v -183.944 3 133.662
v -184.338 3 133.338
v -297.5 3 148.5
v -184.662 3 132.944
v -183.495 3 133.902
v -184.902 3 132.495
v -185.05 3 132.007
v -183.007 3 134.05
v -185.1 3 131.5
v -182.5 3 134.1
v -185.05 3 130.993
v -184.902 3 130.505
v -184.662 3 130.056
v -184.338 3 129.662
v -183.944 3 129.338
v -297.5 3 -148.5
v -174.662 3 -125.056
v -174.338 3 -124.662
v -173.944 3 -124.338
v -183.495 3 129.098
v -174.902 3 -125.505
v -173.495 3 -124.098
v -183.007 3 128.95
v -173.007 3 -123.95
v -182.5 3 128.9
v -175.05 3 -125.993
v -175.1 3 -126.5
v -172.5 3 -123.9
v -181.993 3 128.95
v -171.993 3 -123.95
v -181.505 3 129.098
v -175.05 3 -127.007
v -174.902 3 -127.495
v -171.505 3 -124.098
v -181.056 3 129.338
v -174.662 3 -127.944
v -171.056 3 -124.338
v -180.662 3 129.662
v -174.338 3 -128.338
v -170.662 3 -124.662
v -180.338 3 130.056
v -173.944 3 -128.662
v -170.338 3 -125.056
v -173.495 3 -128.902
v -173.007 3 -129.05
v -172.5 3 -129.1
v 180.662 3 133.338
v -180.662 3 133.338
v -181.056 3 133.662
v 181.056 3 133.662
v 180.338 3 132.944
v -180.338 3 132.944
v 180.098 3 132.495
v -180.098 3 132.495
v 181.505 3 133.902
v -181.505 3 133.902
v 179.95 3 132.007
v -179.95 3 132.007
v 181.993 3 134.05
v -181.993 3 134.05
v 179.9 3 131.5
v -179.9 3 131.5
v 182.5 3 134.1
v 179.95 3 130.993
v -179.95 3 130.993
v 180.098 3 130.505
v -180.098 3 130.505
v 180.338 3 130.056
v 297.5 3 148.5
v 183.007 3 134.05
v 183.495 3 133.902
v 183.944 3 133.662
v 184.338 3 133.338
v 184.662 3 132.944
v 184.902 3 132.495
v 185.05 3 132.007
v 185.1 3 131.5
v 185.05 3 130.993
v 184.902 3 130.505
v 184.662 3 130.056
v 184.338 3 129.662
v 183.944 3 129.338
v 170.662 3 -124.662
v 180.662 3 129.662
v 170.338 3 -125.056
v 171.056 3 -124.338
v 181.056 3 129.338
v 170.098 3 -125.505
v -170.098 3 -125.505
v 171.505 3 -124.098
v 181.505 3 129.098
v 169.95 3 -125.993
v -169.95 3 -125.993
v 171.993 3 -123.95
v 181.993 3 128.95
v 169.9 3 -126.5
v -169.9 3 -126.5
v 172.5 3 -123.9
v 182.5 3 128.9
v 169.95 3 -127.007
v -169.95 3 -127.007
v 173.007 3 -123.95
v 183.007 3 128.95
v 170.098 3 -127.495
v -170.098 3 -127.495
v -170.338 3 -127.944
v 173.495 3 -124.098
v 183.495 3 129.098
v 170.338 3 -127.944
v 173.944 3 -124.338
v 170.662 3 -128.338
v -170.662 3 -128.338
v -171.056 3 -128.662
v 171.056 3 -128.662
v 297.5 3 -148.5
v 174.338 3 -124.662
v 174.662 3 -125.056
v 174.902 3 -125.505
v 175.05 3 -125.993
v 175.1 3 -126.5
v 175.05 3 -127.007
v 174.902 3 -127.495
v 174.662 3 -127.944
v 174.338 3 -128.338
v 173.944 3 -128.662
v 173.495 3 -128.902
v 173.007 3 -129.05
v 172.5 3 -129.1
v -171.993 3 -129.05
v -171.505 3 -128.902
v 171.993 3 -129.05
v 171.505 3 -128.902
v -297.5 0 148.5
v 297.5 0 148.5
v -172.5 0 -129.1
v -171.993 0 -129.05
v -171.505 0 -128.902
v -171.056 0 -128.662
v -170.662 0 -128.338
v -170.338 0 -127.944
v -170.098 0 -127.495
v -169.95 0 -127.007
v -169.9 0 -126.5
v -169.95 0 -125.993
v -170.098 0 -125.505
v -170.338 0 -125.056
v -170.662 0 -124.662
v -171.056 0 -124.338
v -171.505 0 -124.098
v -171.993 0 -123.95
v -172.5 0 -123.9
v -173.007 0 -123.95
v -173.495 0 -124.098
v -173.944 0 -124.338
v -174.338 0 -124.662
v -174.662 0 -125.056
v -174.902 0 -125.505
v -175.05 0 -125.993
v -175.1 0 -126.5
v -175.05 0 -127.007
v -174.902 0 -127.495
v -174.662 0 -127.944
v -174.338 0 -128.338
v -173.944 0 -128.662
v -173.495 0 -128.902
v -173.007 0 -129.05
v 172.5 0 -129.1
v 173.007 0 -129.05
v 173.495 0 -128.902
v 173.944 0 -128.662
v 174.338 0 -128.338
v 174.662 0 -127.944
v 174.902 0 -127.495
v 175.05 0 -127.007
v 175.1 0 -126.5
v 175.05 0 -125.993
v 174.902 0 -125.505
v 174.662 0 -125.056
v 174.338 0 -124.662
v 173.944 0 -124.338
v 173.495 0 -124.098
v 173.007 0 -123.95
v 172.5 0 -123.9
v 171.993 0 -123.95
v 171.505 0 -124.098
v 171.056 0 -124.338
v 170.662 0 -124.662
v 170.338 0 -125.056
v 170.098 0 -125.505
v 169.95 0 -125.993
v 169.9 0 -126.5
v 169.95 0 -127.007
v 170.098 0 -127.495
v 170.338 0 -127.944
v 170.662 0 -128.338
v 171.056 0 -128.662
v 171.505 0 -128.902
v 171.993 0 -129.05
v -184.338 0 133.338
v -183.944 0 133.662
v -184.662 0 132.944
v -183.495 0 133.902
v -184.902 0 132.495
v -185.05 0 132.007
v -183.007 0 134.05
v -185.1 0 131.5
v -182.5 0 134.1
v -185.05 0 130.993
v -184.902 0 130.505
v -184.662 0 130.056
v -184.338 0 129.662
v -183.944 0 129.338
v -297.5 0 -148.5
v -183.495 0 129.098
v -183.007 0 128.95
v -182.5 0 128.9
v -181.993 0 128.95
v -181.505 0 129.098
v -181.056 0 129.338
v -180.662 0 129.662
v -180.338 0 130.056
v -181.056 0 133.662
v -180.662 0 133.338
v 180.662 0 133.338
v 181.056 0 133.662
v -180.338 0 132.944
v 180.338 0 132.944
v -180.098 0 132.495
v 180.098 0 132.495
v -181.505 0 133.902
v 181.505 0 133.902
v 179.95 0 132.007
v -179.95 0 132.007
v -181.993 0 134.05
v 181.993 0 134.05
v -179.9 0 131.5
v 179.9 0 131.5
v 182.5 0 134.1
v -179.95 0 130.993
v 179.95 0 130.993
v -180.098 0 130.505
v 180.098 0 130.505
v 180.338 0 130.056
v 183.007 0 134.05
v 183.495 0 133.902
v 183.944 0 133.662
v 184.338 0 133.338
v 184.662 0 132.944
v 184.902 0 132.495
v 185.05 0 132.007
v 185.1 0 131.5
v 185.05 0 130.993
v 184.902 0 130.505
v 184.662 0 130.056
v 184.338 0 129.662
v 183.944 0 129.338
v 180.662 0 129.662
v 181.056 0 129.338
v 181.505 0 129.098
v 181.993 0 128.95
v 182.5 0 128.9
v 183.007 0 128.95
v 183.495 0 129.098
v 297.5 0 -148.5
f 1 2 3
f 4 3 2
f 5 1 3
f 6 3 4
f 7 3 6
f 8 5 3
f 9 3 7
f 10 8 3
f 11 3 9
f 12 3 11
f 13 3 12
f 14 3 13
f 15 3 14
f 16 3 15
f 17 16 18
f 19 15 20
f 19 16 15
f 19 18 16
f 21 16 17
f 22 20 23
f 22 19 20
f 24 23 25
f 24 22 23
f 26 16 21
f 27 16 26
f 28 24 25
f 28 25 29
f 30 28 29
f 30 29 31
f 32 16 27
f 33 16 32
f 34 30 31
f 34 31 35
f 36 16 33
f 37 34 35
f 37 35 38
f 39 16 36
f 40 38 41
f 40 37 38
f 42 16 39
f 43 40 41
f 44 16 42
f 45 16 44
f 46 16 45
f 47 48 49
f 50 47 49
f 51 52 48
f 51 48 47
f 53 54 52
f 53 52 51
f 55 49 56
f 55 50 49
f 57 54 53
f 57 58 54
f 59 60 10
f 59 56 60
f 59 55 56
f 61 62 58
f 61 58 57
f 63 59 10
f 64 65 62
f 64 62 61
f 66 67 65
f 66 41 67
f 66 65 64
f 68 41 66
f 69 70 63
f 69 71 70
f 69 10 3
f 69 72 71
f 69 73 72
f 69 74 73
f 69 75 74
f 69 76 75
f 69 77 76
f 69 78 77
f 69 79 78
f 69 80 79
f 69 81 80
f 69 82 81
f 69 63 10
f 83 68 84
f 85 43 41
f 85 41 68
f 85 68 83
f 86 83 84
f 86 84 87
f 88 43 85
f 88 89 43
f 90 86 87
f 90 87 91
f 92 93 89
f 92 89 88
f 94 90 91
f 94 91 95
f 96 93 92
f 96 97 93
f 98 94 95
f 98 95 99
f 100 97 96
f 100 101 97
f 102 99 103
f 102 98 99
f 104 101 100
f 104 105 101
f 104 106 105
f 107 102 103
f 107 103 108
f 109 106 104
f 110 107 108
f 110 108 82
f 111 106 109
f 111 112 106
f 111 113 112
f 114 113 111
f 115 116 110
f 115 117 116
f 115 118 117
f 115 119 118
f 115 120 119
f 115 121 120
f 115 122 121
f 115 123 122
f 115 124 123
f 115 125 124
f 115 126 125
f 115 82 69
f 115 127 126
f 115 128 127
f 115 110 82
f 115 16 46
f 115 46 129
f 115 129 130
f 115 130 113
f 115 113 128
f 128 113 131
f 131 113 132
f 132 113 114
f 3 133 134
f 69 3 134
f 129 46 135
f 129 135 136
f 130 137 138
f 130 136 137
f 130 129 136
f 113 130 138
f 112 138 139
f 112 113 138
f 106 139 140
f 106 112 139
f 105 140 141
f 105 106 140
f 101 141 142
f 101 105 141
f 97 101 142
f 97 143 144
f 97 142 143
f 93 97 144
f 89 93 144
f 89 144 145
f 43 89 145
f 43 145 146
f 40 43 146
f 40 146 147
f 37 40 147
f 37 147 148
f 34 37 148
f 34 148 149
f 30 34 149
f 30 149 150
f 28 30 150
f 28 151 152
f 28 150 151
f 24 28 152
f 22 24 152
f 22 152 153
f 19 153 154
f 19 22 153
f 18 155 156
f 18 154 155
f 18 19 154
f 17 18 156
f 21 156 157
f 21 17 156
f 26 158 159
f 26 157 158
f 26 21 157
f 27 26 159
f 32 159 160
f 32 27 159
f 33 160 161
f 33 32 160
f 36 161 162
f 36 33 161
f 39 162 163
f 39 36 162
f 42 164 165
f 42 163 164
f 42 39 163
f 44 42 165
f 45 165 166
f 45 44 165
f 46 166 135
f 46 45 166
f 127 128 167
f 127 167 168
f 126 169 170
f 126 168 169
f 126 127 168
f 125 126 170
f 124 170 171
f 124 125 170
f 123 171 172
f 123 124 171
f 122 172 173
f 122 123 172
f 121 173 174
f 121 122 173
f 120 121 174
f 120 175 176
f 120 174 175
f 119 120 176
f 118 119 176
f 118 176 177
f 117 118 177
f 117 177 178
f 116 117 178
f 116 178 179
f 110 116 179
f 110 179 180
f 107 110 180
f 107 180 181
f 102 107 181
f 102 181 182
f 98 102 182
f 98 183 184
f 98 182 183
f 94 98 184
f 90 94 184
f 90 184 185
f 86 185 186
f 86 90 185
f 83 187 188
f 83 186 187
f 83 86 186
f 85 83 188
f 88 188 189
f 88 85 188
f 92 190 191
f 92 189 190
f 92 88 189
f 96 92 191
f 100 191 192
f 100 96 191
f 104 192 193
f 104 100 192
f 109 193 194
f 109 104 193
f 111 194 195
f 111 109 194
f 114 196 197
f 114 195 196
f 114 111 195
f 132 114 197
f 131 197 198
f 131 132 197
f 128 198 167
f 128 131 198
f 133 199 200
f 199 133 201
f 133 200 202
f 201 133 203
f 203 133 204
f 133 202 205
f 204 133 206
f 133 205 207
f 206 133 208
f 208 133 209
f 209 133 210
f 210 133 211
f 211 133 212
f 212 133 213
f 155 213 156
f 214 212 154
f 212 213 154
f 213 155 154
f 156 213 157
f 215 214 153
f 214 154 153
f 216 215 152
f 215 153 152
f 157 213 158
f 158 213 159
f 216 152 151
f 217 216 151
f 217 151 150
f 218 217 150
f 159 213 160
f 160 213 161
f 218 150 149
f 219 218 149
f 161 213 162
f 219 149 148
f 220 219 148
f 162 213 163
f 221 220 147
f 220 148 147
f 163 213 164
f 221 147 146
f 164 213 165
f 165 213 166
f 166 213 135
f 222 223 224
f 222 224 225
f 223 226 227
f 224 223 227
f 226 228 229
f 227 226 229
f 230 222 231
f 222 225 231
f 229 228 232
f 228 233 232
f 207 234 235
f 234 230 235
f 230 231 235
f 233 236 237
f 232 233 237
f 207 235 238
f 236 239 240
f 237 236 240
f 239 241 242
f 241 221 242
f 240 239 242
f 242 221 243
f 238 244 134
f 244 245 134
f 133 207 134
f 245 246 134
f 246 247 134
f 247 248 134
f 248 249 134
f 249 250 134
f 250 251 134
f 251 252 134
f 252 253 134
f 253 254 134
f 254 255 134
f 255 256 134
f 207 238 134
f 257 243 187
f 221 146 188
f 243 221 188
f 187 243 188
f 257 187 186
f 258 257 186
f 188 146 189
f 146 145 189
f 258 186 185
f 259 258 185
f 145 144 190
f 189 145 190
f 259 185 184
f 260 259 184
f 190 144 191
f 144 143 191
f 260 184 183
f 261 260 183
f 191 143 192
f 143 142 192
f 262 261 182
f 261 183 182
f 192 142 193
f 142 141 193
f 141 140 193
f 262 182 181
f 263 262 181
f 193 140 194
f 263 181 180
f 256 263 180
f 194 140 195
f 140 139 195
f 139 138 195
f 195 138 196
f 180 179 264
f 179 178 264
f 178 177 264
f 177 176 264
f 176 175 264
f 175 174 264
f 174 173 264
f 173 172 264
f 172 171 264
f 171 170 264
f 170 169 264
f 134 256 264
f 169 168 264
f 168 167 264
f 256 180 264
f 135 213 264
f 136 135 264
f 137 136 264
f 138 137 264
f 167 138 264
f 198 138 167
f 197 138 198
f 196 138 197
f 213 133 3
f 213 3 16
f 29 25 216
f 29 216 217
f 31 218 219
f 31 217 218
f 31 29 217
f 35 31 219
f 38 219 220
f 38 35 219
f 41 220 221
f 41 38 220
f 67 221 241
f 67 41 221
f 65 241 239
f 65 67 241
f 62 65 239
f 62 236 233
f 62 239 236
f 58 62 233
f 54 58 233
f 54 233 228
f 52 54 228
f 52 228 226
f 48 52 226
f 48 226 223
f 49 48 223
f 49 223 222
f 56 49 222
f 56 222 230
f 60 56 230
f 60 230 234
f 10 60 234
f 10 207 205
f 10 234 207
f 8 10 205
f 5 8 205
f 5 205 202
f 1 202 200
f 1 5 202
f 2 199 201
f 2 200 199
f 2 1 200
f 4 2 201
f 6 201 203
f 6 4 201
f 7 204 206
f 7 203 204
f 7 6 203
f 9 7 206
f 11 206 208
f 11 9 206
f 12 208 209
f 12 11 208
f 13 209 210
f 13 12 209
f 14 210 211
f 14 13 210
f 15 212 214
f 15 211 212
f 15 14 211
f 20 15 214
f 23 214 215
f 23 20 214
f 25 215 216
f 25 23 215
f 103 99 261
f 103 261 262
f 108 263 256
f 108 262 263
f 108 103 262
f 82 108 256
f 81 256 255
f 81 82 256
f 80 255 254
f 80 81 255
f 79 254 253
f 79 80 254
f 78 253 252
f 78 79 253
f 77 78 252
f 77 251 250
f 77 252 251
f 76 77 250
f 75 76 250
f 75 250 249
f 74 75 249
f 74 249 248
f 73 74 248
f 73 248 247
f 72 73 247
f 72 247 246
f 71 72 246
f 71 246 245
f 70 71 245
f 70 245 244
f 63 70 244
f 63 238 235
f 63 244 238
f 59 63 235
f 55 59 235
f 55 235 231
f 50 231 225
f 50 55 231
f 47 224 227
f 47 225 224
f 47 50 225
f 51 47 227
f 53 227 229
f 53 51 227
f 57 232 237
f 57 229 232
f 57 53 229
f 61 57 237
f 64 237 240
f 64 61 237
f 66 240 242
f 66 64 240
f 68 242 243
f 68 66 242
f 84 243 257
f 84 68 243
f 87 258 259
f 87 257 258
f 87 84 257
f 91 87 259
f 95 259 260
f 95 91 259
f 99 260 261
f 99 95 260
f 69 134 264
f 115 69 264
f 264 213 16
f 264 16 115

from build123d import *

# Parameters (mm, degrees)
SKETCH1_W               = 595
SKETCH1_H               = 297
BOSS_EXTRUDE1_DEPTH     = 3
CUT_EXTRUDE1_DEPTH      = 333.516916863
CUT_EXTRUDE1_DEPTH_BACK = 333.516916863
SKETCH2_R               = 2.6
CUT_EXTRUDE2_DEPTH      = 333.516916863
CUT_EXTRUDE2_DEPTH_BACK = 333.516916863
SKETCH3_R               = 2.6


with BuildPart() as part:
    # Sketch1 → Boss-Extrude1 (new body)
    with BuildSketch(Plane(origin=(0, 0, 0), x_dir=(1, 0, 0), z_dir=(0, 1, 0))):
        Rectangle(SKETCH1_W, SKETCH1_H)
    extrude(amount=BOSS_EXTRUDE1_DEPTH)

    # Sketch2 → Cut-Extrude1 (cut, two sides: drawn at the far end of the back side and taken through both)
    with BuildSketch(Plane.XZ.offset(-CUT_EXTRUDE1_DEPTH_BACK)):
        with Locations(Location((182.5, 131.5, 0), (0, 0, 270))):
            Circle(SKETCH2_R)
        with Locations(Location((-182.5, 131.5, 0), (0, 0, 270))):
            Circle(SKETCH2_R)
    extrude(amount=CUT_EXTRUDE1_DEPTH + CUT_EXTRUDE1_DEPTH_BACK, mode=Mode.SUBTRACT)

    # Sketch3 → Cut-Extrude2 (cut, two sides: drawn at the far end of the back side and taken through both)
    with BuildSketch(Plane(origin=(0, 0, 0), x_dir=(-1, 0, 0), z_dir=(0, -1, 0)).offset(-CUT_EXTRUDE2_DEPTH_BACK)):
        with Locations(Location((-172.5, 126.5, 0), (0, 0, 90))):
            Circle(SKETCH3_R)
        with Locations(Location((172.5, 126.5, 0), (0, 0, 90))):
            Circle(SKETCH3_R)
    extrude(amount=CUT_EXTRUDE2_DEPTH + CUT_EXTRUDE2_DEPTH_BACK, mode=Mode.SUBTRACT)


solid = part.part
